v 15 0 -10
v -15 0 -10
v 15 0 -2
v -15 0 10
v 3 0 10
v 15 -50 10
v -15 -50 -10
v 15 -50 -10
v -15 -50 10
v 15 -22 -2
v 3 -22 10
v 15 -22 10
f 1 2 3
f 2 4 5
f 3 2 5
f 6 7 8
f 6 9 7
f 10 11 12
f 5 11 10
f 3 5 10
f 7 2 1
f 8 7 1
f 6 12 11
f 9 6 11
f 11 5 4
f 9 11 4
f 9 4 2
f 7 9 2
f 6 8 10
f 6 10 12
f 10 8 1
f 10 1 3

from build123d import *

# Parameters (mm, degrees)
F1_DEPTH = 50
F2_DEPTH = 22


with BuildPart() as f1:
    # F0 (on Front) → F1 (new body)
    with BuildSketch(Plane.XZ):
        Polygon((-15, -10), (15, -10), (15, -2), (3, 10), (-15, 10), align=None)
        Polygon((3, 10), (15, -2), (15, 10), align=None)
    extrude(amount=F1_DEPTH)

    # F0 (on Front) → F2 (cut)
    with BuildSketch(Plane.XZ):
        Polygon((3, 10), (15, -2), (15, 10), align=None)
    extrude(amount=F2_DEPTH, mode=Mode.SUBTRACT)


solid = f1.part
